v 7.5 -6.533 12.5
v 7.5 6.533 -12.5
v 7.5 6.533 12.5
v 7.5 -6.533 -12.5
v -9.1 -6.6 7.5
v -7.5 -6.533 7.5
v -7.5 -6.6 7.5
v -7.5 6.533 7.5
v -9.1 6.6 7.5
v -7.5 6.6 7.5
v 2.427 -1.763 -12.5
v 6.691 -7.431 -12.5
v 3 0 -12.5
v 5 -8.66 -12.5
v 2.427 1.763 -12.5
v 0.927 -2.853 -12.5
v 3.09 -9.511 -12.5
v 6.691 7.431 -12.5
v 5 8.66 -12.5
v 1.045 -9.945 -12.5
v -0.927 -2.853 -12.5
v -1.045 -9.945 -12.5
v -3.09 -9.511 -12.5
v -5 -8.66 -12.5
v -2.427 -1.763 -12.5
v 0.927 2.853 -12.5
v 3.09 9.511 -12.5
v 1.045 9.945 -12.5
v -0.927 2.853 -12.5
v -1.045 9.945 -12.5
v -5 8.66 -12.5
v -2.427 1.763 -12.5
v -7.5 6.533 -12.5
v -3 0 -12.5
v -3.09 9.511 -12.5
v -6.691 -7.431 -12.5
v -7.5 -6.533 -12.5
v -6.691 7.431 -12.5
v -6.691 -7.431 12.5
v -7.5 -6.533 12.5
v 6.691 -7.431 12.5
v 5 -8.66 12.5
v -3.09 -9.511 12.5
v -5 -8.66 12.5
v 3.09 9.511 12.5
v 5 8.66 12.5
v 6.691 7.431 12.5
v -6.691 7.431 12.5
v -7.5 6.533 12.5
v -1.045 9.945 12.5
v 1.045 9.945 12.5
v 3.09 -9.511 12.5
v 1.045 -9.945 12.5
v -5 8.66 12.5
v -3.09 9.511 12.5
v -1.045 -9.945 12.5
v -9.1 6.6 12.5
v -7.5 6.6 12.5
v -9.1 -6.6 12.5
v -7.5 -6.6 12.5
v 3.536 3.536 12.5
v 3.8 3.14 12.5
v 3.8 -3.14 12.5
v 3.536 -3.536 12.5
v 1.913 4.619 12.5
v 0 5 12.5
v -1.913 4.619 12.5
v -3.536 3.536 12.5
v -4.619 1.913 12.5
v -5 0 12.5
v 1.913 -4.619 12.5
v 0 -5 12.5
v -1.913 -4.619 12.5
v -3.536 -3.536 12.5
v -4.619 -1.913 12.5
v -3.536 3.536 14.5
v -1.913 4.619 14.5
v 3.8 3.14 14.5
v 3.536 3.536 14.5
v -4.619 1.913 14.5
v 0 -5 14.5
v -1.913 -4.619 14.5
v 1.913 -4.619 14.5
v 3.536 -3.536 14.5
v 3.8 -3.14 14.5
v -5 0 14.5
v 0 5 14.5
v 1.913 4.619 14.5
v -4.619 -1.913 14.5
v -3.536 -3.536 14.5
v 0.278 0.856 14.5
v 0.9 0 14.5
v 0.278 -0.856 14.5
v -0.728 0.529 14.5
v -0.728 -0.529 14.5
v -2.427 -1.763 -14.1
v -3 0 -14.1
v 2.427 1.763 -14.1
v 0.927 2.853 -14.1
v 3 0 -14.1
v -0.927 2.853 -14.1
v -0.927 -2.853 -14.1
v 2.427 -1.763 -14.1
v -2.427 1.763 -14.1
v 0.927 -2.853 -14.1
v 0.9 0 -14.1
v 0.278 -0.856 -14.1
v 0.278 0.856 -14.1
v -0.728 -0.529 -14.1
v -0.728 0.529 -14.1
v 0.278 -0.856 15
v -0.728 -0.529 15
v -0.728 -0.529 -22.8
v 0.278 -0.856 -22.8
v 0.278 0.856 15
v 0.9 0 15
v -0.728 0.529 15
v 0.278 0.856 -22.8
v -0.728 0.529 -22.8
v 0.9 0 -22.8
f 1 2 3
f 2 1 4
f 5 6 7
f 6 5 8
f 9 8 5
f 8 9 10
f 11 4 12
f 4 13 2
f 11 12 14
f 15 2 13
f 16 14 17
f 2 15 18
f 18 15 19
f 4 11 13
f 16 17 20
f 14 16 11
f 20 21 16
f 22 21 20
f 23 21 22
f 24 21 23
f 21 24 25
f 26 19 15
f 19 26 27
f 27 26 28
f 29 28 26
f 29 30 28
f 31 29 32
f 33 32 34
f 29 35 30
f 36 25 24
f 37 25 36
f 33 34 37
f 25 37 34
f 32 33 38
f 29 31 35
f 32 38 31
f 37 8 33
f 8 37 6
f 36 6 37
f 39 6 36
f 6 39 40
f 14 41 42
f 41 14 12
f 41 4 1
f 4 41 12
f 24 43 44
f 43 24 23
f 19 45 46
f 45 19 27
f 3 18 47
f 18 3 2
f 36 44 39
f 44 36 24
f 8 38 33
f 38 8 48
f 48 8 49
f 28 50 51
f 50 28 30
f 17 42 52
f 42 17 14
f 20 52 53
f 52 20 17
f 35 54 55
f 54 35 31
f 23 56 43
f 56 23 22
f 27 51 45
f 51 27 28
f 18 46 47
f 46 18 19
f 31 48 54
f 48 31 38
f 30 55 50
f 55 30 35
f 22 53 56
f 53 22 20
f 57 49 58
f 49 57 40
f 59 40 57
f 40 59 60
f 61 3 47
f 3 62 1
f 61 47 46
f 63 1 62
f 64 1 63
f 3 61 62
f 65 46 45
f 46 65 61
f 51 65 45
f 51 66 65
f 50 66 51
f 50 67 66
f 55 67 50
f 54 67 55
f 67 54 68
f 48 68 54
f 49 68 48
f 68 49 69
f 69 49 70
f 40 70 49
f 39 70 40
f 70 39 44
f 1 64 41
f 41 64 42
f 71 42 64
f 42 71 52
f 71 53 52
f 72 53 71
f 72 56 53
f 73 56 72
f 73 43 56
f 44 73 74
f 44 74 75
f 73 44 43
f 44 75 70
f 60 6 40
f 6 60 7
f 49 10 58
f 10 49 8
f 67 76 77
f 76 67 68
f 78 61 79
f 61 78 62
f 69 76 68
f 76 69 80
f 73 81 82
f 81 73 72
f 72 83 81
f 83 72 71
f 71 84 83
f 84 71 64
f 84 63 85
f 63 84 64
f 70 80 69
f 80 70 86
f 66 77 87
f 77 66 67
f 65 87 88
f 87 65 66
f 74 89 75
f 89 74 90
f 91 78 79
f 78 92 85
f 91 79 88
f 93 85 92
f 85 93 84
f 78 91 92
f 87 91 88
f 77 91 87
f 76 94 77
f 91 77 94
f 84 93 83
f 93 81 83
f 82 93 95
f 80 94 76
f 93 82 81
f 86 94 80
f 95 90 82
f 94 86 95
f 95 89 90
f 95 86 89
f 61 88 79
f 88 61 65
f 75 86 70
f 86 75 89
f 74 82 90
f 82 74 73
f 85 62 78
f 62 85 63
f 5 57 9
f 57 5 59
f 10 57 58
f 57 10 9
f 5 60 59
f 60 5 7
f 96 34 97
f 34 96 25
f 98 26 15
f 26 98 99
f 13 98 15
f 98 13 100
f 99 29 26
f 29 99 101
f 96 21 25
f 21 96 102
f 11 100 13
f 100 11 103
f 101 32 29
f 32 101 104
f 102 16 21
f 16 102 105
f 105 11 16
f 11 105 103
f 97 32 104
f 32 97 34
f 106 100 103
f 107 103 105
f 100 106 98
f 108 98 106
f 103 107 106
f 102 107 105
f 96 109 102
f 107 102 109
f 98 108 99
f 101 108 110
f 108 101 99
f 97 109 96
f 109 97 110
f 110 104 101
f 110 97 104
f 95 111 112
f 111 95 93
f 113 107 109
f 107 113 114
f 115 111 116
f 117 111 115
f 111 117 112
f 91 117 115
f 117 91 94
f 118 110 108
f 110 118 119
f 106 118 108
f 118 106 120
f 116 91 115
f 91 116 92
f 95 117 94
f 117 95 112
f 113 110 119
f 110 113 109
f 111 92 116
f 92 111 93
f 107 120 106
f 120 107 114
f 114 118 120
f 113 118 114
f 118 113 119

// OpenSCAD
module generic3vMotor(){
    // Main body
    color("silver"){
        translate([0,0,-2.5]){
            intersection(){
                cube([15,20,20], center=true);
                cylinder(d=20,h=20, center=true);
            }
        }
    }
    color("#333333"){
        translate([0,0,10]){
            intersection(){
                cube([15,20,5], center=true);
                cylinder(d=20,h=5, center=true);
            }
        }
    }
    // Rear motor hump
    color("#333333"){
        translate([0,0,(25+2)/2]){
            difference(){
                cylinder(d=10,h=2, center=true);
                translate([10-(10-8.8),0,0])cube([10,10,2+0.1], center=true);
            }
        }
    }
    // Power solder tabs + plastic lump
    color("#333333")translate([-8.3,0,10])cube([1.6,13.2,5], center=true);
    // Motor housing snoot
    color("silver")translate([0,0,(25+1.6)/-2])cylinder(d=6,h=1.6, center=true);
    // Motor shaft and rear pip
    color("silver")translate([0,0,-3.9])cylinder(d=1.8,h=37.8, center=true);
}


generic3vMotor();
